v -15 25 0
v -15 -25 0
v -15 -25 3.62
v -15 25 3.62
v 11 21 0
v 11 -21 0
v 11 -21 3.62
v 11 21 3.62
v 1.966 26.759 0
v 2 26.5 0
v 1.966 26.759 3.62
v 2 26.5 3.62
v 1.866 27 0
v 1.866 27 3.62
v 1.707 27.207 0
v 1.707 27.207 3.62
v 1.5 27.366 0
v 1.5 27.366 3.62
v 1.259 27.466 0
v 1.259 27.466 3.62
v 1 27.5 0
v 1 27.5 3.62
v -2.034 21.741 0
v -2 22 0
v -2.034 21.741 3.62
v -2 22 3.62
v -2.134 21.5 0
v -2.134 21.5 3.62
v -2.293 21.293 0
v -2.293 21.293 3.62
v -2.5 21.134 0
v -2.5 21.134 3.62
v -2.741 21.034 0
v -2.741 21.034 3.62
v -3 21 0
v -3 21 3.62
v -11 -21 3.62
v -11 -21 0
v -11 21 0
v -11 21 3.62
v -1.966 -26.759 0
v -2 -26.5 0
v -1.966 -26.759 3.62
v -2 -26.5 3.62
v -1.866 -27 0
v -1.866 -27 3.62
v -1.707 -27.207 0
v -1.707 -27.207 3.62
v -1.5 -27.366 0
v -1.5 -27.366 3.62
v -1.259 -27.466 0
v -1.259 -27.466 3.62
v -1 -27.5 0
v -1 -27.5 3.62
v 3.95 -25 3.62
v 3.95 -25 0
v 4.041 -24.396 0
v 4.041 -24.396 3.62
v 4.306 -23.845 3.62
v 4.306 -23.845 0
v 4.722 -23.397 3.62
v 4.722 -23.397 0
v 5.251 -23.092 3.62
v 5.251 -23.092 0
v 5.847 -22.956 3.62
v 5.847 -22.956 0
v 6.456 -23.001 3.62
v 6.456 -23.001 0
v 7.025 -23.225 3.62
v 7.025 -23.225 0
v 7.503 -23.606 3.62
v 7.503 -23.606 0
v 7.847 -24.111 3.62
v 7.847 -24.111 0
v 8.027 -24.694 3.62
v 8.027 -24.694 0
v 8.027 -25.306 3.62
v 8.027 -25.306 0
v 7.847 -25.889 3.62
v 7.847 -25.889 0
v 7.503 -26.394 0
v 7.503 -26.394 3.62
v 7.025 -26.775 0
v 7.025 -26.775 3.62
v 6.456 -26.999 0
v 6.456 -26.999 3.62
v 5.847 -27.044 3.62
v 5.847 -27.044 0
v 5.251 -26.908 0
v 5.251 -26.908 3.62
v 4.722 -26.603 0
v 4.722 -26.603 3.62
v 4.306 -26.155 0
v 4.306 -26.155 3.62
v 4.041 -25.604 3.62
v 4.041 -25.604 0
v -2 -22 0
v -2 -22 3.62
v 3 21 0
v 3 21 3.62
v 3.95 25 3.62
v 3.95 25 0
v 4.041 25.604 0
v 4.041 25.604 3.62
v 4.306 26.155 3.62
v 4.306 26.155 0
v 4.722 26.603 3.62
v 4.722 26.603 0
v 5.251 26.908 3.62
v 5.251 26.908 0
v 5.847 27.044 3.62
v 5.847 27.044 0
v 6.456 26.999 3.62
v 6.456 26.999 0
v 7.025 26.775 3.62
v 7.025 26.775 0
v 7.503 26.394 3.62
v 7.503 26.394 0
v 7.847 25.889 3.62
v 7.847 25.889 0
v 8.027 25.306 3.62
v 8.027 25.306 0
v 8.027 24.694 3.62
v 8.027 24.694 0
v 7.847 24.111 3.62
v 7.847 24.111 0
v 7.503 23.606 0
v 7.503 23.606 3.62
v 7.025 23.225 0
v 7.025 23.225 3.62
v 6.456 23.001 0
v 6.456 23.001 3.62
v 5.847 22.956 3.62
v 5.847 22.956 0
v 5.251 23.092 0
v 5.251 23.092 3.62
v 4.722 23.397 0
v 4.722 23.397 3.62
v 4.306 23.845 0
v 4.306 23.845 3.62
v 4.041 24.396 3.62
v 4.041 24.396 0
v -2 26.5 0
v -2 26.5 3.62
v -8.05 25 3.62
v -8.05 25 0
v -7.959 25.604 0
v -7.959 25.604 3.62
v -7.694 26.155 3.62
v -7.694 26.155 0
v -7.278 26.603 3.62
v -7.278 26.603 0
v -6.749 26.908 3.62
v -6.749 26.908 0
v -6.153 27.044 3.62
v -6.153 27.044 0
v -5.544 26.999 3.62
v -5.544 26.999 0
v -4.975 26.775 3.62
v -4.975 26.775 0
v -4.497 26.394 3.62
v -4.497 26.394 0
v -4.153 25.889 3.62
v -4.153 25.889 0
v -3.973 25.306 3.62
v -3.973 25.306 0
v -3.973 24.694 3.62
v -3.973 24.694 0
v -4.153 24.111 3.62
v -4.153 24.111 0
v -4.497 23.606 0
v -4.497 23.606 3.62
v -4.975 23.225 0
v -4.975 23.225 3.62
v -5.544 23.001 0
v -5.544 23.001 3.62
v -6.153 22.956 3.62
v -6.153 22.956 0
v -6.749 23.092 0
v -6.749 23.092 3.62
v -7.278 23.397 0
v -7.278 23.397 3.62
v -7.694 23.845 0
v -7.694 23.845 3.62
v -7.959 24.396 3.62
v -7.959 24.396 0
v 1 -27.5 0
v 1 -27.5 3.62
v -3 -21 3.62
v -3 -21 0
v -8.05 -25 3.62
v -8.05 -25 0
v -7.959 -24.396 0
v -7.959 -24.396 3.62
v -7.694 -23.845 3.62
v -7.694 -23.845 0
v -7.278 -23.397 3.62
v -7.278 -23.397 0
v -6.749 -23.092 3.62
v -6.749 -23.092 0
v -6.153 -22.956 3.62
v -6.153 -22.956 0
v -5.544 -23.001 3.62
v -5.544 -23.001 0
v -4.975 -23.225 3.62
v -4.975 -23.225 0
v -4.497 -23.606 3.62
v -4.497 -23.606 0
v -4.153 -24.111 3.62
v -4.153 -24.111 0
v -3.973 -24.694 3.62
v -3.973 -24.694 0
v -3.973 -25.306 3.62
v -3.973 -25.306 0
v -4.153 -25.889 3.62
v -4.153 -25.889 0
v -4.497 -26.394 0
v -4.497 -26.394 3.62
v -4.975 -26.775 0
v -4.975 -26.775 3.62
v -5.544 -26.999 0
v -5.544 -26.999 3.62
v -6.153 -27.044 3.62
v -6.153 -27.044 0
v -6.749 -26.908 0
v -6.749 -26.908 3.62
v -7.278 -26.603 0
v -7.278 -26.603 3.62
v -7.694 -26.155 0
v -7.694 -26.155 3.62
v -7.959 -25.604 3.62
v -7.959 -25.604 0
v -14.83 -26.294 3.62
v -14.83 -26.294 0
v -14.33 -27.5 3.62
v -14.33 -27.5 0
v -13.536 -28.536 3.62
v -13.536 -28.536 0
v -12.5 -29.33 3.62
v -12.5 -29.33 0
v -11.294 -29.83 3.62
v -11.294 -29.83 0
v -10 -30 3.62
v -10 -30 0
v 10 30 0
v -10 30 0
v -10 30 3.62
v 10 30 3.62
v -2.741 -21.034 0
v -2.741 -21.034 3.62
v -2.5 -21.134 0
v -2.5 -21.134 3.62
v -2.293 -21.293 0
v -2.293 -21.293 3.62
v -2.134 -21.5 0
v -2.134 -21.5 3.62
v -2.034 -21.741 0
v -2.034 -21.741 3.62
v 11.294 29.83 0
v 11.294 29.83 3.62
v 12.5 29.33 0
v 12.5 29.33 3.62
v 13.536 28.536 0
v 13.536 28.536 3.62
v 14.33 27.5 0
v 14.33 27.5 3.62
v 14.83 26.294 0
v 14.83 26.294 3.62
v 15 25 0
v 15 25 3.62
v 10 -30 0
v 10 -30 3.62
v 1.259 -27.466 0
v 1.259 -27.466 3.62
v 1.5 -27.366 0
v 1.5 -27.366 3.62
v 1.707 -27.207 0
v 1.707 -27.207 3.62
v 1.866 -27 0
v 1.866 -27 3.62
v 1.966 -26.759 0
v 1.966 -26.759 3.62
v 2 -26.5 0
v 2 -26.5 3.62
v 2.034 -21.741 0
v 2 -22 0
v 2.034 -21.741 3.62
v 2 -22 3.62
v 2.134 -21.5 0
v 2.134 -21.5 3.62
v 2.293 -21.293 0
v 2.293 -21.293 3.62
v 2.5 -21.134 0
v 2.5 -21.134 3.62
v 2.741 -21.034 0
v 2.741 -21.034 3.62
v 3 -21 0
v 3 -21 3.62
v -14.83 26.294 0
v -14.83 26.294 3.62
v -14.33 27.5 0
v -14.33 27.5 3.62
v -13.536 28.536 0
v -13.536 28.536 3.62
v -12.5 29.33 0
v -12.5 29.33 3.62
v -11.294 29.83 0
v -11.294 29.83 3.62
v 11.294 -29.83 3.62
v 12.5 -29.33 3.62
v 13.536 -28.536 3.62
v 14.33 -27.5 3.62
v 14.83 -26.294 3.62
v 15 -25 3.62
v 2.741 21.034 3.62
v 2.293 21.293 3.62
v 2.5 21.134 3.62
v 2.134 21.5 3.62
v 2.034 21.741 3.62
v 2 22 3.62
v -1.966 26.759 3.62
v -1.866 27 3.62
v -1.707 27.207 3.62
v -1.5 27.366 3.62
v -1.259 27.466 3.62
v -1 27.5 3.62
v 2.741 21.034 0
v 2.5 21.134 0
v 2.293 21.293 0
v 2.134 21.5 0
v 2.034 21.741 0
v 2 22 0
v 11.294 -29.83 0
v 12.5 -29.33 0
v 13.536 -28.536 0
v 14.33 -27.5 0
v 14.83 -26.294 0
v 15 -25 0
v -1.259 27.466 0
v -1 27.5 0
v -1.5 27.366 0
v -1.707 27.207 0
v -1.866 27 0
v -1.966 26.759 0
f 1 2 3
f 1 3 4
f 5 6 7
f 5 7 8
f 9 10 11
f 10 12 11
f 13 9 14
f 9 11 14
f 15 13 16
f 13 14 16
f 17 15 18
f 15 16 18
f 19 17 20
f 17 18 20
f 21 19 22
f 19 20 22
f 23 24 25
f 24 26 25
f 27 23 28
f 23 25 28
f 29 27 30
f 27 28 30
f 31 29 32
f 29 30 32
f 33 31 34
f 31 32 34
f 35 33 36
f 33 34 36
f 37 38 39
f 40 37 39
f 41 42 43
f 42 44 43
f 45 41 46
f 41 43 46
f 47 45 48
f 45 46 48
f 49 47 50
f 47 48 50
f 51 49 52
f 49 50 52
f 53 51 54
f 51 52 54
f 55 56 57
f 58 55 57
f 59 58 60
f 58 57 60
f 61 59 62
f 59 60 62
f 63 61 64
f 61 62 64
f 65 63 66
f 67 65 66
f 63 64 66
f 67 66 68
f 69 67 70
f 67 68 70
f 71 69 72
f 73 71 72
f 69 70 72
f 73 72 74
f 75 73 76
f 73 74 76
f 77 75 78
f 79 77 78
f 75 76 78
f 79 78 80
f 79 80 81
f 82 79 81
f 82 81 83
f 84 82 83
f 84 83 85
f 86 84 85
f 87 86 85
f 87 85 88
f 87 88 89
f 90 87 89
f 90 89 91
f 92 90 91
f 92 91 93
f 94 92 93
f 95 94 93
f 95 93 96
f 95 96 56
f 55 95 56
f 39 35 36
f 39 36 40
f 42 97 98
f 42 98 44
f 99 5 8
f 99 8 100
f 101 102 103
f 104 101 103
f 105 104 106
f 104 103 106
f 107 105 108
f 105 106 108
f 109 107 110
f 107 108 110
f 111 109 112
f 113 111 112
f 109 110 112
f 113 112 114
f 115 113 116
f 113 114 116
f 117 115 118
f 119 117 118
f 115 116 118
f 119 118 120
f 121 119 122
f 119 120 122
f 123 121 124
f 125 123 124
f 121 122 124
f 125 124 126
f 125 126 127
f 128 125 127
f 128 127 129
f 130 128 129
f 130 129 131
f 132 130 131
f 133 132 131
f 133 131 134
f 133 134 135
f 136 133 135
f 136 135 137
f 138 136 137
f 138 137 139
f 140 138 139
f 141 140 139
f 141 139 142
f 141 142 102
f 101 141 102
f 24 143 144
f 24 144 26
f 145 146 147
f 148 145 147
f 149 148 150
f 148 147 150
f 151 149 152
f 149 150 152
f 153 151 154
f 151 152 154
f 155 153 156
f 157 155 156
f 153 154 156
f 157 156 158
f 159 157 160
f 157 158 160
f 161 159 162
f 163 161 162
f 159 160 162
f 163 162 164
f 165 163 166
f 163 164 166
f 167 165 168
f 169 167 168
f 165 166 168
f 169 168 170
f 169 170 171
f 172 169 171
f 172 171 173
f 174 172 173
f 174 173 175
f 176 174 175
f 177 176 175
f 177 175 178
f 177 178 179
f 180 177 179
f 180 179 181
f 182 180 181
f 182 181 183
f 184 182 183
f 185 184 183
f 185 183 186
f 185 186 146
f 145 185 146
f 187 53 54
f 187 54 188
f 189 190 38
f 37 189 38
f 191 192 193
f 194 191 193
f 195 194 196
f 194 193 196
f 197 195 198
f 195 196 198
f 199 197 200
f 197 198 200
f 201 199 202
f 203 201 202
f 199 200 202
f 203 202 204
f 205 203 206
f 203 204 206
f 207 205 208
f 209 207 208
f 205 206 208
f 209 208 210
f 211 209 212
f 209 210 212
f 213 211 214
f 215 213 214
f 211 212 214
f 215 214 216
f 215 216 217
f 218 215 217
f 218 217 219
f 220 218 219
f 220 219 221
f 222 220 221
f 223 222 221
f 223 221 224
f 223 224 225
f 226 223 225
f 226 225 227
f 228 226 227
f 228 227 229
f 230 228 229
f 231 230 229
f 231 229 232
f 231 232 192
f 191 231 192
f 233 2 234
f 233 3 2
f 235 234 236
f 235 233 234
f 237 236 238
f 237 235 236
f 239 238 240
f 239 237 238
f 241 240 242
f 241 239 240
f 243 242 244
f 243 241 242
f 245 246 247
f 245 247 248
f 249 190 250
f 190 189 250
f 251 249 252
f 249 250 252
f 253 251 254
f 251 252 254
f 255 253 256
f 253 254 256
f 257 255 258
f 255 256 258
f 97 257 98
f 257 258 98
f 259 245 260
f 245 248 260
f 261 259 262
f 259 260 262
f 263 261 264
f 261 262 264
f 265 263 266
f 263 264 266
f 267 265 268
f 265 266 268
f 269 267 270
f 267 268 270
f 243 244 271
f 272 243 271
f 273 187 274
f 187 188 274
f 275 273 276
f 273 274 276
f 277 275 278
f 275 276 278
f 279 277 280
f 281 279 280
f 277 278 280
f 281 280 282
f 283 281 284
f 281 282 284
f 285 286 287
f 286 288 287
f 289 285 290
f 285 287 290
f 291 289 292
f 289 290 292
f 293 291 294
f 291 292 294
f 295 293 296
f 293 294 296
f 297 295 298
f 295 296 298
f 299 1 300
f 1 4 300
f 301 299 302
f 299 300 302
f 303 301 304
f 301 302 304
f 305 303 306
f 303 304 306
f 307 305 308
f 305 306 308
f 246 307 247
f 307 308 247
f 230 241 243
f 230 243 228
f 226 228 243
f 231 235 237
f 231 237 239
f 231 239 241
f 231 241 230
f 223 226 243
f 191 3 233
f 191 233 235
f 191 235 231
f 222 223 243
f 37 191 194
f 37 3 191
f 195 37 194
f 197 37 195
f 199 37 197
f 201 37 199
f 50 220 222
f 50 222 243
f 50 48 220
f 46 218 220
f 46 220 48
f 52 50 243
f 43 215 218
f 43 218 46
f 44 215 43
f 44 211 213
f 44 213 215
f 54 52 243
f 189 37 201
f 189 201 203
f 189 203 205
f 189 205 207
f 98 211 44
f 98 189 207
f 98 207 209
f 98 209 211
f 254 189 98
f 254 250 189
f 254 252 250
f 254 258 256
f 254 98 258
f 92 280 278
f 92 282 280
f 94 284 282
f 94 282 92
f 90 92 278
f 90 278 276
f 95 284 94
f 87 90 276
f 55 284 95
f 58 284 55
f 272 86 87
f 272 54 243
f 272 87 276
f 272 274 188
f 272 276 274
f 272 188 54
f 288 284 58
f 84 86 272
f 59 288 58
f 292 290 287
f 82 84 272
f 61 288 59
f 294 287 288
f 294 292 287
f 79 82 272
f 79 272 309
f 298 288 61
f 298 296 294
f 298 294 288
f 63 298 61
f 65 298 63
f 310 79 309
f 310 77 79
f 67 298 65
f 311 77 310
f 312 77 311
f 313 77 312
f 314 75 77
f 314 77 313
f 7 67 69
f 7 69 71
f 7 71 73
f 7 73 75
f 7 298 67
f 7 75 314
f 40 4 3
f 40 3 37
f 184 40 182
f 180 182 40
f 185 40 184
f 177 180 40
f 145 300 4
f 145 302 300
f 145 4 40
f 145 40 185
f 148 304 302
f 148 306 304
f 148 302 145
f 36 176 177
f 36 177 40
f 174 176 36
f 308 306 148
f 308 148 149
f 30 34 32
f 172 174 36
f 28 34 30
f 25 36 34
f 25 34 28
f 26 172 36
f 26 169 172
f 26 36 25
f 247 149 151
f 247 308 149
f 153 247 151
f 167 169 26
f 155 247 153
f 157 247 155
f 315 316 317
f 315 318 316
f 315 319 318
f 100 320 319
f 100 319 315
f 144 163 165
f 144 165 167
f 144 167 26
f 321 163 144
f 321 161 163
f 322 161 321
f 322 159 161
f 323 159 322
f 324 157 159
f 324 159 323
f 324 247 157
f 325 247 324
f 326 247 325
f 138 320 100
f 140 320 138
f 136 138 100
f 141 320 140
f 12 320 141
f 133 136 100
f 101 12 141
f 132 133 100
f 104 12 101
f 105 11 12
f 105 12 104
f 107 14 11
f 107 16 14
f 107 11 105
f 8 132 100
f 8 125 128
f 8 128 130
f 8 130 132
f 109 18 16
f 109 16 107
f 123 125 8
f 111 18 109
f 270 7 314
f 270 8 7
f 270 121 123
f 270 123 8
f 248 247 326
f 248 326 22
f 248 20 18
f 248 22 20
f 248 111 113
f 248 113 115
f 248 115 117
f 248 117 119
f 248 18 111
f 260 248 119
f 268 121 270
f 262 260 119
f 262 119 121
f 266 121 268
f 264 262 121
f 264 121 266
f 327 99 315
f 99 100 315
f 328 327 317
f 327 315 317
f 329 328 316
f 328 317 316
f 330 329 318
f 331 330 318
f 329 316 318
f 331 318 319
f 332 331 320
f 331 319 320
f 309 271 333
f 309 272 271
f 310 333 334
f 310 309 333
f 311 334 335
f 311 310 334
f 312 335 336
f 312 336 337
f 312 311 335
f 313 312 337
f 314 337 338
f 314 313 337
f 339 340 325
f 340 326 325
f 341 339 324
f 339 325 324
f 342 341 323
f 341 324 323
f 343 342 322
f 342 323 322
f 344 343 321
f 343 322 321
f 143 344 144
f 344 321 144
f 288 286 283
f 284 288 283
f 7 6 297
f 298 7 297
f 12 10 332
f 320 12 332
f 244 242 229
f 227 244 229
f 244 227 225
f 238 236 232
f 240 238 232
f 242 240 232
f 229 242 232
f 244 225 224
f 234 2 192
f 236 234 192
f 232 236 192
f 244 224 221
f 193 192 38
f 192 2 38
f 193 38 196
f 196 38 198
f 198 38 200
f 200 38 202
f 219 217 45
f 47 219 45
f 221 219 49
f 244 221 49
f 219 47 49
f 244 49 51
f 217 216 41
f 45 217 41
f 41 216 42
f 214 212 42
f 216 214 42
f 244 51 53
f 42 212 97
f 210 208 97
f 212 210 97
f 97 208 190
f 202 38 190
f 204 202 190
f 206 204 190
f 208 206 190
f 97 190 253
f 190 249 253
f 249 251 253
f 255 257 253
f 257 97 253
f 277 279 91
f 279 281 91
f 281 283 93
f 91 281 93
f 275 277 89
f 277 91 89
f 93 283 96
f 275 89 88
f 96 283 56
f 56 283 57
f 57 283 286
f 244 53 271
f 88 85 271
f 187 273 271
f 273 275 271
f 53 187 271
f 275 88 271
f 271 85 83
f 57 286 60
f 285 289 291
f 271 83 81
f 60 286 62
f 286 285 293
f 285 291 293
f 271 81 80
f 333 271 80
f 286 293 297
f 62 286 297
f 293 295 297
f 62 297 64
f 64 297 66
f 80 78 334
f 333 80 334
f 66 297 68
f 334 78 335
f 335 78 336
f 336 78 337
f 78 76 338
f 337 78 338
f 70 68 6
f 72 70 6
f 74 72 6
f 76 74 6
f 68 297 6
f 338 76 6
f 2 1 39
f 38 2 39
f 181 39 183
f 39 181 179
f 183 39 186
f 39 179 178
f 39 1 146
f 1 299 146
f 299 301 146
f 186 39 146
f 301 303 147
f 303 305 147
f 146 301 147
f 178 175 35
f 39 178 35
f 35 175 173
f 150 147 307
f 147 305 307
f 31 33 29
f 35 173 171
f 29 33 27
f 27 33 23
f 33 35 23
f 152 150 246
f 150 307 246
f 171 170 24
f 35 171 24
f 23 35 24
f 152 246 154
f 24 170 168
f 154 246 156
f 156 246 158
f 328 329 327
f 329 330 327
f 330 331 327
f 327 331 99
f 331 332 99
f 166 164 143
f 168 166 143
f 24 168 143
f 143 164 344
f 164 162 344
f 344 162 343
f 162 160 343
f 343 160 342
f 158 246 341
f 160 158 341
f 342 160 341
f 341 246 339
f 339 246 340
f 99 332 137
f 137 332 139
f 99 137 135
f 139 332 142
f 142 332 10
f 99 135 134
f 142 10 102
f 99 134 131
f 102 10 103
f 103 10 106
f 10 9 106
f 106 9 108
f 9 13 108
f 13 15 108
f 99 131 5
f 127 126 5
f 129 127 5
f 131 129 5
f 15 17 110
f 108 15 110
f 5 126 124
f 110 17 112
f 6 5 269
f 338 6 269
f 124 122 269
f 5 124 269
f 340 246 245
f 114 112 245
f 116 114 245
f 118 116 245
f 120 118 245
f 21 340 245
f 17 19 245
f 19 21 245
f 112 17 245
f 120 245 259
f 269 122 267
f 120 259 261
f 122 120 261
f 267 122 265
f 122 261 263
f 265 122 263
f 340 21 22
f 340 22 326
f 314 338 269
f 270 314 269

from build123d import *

# Parameters (mm, degrees)
CROQUIS1_W              = 30
CROQUIS1_H              = 60
SALIENTE_EXTRUIR1_DEPTH = 3.62
CROQUIS2_W              = 22
CROQUIS2_H              = 42
CORTAR_EXTRUIR1_DEPTH   = 34.73580294
CROQUIS3_R              = 2.05
CORTAR_EXTRUIR2_DEPTH   = 34.73580294
REDONDEO1_R             = 5
REDONDEO3_R             = 1


with BuildPart() as part:
    # Croquis1 → Saliente-Extruir1 (new body)
    with BuildSketch(Plane.XY):
        Rectangle(CROQUIS1_W, CROQUIS1_H)
    extrude(amount=SALIENTE_EXTRUIR1_DEPTH)

    # Croquis2 → Cortar-Extruir1 (cut, through all)
    with BuildSketch(Plane(origin=(0, 0, 0), x_dir=(-1, 0, 0), z_dir=(0, 0, -1))):
        Rectangle(CROQUIS2_W, CROQUIS2_H)
    extrude(amount=-CORTAR_EXTRUIR1_DEPTH, mode=Mode.SUBTRACT)

    # Croquis3 → Cortar-Extruir2 (cut, through all)
    with BuildSketch(Plane(origin=(0, 0, 0), x_dir=(-1, 0, 0), z_dir=(0, 0, -1))):
        with Locations((-6, 25)):
            Circle(CROQUIS3_R)
        with Locations((6, 25)):
            Circle(CROQUIS3_R)
        with Locations((-6, -25)):
            Circle(CROQUIS3_R)
        with Locations((6, -25)):
            Circle(CROQUIS3_R)
        Polygon((-2, 21), (-2, 27.5), (2, 27.5), (2, -27.5), (-2, -27.5), align=None)
    extrude(amount=-CORTAR_EXTRUIR2_DEPTH, mode=Mode.SUBTRACT)

    # Redondeo1
    redondeo1_edges = [part.edges().sort_by_distance(p)[0] for p in [
        (-15, 30, 1.81),
        (15, 30, 1.81),
        (15, -30, 1.81),
        (-15, -30, 1.81),
    ]]
    fillet(redondeo1_edges, radius=REDONDEO1_R)

    # Redondeo3
    redondeo3_edges = [part.edges().sort_by_distance(p)[0] for p in [
        (2, -21, 1.81),
        (-2, -21, 1.81),
        (-2, 21, 1.81),
        (-2, 27.5, 1.81),
        (2, 21, 1.81),
        (2, -27.5, 1.81),
        (-2, -27.5, 1.81),
        (2, 27.5, 1.81),
    ]]
    fillet(redondeo3_edges, radius=REDONDEO3_R)


solid = part.part
